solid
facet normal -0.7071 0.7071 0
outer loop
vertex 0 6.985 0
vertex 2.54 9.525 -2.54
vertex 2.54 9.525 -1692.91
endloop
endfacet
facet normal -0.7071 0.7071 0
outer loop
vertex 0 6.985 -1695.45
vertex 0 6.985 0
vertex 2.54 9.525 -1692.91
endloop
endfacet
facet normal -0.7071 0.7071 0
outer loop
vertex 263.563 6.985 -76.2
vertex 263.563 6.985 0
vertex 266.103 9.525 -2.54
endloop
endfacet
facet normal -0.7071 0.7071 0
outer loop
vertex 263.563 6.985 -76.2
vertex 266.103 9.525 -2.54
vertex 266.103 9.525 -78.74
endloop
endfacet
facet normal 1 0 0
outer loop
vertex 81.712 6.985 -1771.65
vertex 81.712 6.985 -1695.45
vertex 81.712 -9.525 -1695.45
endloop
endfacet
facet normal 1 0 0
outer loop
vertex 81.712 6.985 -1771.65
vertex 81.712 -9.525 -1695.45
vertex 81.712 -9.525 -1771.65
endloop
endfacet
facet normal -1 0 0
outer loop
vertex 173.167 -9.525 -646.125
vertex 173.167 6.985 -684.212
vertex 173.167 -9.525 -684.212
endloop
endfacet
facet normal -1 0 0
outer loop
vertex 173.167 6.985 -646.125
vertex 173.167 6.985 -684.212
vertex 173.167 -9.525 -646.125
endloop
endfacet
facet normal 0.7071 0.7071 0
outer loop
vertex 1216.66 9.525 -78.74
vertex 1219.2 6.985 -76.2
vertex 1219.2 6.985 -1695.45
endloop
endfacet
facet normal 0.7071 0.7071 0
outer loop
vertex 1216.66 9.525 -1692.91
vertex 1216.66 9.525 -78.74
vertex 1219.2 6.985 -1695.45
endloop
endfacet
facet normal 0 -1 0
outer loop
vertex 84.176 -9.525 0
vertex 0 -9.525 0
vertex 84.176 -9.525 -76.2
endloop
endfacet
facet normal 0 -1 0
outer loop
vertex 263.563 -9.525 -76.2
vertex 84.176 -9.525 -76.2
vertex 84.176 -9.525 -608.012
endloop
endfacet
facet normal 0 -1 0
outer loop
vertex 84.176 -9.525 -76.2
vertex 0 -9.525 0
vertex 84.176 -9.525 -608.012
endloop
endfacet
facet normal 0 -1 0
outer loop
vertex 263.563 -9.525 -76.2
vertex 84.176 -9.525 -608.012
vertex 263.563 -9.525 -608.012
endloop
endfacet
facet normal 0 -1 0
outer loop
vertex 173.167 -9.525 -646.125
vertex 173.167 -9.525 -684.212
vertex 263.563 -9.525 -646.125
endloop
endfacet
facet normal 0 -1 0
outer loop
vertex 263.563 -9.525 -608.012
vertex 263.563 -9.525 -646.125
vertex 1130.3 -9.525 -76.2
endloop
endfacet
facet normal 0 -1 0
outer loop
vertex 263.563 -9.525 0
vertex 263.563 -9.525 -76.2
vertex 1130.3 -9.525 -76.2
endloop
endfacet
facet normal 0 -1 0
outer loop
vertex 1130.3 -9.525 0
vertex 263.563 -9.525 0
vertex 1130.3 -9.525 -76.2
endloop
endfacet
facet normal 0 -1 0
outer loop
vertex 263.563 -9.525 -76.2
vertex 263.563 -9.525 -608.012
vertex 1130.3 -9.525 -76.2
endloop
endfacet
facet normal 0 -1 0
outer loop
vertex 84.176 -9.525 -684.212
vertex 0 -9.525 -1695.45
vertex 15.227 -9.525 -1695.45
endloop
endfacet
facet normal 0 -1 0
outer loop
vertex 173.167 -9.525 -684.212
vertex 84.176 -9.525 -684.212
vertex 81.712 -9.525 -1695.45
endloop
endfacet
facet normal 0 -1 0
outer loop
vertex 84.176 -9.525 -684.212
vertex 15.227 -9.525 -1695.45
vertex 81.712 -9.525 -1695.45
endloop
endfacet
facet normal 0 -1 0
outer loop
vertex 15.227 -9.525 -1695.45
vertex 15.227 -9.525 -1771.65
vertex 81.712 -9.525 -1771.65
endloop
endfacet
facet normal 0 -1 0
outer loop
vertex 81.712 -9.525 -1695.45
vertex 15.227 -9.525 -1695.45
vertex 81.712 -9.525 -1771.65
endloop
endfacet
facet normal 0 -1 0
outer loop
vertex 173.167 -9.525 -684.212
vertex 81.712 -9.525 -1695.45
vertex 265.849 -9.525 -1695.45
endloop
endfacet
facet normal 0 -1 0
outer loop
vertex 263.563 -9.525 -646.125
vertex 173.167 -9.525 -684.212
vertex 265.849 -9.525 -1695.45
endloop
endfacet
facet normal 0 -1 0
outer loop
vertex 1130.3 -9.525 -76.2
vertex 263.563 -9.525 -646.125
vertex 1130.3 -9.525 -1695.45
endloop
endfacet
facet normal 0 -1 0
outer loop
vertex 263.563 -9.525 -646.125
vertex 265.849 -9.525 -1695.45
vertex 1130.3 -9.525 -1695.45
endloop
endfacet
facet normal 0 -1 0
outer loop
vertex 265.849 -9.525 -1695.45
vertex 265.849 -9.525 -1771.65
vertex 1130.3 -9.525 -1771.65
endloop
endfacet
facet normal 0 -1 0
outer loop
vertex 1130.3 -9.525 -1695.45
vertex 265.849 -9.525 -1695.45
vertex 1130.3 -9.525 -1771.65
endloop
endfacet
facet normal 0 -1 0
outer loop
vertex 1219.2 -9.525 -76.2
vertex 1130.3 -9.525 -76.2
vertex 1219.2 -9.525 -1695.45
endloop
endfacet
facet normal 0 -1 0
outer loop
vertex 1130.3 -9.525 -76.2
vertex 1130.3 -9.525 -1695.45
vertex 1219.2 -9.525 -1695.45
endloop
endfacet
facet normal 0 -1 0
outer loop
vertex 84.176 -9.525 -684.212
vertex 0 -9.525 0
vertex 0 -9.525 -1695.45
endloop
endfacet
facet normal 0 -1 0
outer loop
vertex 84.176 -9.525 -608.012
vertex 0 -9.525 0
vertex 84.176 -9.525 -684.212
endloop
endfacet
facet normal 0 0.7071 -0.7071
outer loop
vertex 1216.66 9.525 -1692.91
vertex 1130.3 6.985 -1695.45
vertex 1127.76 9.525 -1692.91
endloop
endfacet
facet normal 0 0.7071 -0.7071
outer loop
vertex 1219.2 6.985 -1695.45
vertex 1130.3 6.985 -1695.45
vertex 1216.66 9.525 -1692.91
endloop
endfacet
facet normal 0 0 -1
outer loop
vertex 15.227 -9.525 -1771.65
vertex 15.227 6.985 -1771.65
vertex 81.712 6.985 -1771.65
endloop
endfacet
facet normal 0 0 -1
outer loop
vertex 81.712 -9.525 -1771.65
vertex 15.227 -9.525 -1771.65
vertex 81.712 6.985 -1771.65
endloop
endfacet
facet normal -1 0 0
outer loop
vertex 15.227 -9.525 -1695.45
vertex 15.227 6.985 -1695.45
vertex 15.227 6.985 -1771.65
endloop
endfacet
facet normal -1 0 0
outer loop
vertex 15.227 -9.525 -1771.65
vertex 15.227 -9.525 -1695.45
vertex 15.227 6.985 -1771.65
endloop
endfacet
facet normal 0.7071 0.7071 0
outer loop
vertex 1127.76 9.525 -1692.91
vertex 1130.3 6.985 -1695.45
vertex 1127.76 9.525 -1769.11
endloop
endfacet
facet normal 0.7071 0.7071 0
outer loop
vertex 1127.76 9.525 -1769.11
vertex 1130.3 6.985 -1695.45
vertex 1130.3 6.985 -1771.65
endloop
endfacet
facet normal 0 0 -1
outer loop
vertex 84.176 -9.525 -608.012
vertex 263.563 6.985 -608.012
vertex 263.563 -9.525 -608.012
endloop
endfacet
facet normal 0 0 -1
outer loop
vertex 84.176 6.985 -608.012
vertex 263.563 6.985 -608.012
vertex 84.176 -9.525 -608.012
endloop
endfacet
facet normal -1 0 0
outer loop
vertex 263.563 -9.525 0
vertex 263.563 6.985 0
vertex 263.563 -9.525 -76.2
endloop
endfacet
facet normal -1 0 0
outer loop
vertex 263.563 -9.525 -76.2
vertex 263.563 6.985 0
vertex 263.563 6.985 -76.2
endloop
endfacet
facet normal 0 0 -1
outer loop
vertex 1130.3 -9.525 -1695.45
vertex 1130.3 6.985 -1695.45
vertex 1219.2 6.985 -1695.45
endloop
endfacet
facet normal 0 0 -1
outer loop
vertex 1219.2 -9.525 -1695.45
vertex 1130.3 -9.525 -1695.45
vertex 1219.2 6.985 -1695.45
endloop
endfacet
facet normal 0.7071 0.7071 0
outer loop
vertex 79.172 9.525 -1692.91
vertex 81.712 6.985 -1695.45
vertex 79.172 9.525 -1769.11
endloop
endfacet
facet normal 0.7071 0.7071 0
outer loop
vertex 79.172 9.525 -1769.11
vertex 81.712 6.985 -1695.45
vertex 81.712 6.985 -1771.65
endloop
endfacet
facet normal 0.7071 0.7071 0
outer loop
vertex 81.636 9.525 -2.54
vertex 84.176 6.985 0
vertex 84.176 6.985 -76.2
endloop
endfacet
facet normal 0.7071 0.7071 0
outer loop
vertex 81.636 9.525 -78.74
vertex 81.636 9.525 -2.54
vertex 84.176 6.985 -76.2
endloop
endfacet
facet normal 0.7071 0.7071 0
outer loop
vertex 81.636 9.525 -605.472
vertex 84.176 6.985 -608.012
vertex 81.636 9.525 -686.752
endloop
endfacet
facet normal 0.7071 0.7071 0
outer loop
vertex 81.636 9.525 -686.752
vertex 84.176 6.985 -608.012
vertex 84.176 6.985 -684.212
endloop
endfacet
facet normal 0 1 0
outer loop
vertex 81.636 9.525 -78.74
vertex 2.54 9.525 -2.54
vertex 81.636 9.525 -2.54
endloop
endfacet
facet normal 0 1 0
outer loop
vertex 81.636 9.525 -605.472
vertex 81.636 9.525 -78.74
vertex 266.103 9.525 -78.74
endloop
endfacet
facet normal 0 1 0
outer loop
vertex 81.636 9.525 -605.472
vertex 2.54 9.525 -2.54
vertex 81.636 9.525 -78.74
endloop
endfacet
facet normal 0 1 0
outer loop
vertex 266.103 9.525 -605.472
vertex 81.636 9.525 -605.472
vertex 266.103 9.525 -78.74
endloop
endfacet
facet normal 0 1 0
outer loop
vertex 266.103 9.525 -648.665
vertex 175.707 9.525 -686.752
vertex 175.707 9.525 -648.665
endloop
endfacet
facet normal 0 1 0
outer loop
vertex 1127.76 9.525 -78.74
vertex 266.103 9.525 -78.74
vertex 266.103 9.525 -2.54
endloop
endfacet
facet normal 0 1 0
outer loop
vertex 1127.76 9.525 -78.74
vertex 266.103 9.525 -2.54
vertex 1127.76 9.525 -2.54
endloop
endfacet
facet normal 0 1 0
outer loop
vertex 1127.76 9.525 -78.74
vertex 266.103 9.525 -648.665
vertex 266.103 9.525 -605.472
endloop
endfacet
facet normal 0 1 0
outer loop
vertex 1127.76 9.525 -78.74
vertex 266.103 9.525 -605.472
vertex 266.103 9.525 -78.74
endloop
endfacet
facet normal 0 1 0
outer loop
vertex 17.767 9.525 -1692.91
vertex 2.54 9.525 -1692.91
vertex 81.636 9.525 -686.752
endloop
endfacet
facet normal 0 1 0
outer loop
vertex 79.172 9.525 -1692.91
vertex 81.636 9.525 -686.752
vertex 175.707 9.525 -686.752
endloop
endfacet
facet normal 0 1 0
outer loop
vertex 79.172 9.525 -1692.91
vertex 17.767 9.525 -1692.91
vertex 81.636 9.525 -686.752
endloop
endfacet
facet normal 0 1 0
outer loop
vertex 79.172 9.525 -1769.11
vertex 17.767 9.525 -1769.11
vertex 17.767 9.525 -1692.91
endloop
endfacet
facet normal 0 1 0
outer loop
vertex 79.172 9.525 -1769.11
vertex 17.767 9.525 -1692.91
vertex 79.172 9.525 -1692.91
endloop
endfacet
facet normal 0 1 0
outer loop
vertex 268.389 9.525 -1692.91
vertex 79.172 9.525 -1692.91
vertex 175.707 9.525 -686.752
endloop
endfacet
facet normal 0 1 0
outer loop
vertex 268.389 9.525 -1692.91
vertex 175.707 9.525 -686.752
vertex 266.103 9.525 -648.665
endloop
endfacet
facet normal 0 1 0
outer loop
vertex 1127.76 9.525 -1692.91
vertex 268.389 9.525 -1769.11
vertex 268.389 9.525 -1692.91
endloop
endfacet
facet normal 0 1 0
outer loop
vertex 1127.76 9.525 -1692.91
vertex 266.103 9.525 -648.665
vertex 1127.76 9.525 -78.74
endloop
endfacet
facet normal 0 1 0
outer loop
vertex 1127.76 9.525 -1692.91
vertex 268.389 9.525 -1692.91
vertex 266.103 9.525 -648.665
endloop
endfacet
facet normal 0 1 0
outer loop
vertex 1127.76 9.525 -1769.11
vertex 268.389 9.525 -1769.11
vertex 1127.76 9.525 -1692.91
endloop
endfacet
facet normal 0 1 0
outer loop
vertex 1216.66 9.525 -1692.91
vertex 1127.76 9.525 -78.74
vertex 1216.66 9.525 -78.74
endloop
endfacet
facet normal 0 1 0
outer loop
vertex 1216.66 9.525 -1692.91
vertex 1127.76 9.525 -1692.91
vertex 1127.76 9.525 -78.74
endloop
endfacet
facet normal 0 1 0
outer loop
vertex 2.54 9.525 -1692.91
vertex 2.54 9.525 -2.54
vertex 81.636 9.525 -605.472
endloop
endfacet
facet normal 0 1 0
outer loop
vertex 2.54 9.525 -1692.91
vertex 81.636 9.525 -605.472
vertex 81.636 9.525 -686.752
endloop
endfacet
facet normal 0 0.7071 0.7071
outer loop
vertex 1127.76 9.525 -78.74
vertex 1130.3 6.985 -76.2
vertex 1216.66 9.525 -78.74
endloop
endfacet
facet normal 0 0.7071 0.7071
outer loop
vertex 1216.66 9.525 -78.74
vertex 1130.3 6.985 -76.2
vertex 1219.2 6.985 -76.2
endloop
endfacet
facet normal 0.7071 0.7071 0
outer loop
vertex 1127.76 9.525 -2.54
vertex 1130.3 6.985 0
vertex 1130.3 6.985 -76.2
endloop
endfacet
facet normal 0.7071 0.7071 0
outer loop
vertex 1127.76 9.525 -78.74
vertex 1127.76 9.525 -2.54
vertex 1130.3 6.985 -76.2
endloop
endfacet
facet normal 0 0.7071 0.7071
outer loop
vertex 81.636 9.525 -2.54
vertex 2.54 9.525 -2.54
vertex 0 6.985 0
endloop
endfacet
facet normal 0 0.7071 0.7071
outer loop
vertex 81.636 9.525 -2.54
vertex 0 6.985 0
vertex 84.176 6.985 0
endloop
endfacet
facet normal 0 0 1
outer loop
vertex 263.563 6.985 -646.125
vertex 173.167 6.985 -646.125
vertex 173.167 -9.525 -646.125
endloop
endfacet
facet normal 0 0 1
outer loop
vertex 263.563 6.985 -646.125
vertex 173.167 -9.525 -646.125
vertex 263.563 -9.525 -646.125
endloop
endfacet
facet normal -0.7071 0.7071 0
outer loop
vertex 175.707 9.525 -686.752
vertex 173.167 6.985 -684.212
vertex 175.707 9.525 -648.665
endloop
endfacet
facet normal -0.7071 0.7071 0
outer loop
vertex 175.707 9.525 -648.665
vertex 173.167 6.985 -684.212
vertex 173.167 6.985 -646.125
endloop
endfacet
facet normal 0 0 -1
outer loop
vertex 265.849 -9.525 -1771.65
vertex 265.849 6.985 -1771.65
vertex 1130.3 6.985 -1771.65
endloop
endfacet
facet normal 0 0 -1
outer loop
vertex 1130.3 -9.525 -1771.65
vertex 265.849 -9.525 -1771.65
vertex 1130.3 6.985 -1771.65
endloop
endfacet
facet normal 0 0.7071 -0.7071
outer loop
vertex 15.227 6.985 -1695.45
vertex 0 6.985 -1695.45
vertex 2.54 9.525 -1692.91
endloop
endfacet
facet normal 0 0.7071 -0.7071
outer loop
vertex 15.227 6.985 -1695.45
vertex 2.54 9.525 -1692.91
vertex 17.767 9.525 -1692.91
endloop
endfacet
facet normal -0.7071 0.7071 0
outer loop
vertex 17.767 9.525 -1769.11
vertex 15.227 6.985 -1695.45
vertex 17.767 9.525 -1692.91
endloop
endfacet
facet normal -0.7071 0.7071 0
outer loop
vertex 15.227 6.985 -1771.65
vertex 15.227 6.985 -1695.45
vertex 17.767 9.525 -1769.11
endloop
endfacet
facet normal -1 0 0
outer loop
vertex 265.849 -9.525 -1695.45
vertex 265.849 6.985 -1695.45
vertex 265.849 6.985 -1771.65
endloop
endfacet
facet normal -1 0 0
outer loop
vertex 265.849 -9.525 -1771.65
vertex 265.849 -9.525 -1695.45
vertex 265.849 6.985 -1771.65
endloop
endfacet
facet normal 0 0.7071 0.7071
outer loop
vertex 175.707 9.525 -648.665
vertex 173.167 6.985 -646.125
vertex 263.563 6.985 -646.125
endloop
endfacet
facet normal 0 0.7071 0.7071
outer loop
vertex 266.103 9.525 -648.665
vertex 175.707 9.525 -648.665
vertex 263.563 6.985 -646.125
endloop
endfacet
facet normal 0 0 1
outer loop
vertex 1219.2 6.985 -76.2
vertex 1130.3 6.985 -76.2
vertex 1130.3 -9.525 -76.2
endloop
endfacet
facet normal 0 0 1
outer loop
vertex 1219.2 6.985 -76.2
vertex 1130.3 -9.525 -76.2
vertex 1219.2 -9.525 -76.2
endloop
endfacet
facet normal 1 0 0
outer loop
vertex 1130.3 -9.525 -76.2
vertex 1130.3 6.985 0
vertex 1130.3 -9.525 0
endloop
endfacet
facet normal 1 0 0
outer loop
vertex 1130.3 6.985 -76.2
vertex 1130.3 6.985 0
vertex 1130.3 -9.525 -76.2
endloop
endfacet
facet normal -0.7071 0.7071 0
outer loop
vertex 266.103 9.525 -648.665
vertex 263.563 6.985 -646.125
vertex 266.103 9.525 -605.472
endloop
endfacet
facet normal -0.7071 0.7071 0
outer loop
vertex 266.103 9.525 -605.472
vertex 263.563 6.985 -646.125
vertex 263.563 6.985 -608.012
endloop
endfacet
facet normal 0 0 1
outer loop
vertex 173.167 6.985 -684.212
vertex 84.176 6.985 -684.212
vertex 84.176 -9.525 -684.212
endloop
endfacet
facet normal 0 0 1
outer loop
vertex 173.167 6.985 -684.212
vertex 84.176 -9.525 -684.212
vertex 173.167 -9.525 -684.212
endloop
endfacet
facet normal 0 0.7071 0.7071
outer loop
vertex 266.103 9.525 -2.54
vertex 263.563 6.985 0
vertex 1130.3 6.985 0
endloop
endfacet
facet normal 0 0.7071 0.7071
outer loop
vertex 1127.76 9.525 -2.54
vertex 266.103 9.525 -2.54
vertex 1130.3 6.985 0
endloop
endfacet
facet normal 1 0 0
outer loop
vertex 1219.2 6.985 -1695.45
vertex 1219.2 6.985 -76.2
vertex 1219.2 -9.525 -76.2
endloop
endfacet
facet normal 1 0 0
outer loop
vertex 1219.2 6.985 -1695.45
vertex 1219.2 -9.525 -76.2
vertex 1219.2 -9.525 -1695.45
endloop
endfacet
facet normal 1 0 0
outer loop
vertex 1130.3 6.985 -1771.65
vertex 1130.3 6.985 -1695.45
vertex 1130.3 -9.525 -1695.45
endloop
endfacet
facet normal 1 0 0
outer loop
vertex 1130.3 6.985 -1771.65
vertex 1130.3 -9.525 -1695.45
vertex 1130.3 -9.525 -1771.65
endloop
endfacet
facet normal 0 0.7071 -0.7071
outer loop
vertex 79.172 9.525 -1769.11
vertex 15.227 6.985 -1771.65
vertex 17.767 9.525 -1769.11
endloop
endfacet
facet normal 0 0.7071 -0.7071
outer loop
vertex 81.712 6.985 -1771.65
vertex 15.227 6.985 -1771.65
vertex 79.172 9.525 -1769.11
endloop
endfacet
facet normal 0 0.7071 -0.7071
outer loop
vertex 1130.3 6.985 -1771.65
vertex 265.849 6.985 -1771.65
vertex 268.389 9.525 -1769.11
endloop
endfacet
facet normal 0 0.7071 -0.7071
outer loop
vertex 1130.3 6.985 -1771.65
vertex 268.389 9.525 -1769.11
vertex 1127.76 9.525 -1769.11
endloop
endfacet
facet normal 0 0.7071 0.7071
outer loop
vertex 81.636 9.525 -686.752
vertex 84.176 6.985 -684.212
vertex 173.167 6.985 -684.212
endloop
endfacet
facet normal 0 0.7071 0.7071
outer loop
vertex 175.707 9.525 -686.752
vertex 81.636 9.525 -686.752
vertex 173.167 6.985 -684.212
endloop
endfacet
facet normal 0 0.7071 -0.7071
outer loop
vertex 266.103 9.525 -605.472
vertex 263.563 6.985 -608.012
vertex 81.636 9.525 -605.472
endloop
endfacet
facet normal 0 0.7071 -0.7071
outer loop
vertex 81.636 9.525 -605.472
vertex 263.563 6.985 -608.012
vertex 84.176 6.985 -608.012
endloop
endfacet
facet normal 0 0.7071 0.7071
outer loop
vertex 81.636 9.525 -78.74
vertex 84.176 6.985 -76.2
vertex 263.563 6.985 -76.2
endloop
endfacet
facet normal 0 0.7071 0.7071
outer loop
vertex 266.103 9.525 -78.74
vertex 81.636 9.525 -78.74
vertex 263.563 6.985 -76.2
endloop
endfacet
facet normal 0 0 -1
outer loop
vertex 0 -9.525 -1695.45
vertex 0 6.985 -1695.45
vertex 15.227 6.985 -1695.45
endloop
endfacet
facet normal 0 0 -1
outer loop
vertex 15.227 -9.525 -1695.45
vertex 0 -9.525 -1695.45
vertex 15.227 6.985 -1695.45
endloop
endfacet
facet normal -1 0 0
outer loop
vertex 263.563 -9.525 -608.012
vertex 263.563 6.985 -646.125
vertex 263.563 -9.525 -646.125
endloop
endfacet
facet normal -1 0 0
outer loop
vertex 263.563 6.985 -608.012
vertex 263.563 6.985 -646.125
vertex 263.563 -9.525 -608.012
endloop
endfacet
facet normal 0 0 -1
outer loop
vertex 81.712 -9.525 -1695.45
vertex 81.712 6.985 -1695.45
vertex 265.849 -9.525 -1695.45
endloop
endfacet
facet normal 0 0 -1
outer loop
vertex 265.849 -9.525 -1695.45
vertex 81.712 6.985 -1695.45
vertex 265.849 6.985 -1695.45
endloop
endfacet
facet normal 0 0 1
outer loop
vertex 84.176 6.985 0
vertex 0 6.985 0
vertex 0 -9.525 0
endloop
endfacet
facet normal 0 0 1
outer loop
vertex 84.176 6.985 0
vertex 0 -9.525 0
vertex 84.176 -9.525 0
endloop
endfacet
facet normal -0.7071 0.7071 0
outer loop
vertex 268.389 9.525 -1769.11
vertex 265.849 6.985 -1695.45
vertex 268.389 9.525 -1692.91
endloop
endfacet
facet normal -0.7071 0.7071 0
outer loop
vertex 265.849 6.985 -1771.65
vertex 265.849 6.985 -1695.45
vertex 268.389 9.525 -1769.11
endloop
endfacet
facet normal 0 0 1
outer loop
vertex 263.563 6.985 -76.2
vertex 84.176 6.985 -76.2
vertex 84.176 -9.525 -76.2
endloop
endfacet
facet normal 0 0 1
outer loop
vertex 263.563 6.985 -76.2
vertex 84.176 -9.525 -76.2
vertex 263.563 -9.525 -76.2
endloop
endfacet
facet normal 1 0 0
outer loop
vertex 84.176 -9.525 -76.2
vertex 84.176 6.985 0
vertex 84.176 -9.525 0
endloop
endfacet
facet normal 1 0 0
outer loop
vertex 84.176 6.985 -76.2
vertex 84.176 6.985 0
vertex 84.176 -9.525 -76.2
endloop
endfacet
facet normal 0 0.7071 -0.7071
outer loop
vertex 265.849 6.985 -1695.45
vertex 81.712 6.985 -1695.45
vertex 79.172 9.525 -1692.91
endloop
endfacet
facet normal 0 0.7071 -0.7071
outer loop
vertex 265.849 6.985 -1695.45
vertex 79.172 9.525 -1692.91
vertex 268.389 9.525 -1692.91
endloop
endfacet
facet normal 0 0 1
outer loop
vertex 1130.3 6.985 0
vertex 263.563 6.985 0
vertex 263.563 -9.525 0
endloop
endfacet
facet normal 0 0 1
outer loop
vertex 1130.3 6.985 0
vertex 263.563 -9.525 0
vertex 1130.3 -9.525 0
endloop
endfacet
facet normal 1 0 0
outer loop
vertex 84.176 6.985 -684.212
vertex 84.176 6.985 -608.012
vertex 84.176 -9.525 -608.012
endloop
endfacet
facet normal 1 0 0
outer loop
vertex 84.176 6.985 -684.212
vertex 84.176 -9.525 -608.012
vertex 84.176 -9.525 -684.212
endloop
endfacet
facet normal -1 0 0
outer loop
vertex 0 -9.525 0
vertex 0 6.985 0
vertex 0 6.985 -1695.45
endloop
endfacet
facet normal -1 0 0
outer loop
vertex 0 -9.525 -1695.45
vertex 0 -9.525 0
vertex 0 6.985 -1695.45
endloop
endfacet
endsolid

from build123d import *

# Parameters (mm, degrees)
SKETCH1_W           = 1219.2
SKETCH1_H           = 1771.65
BOSS_EXTRUDE1_DEPTH = 9.525
SKETCH3_W           = 184.1373
SKETCH3_H           = 76.2
SKETCH3_W_2         = 88.9
SKETCH3_W_3         = 179.3875
SKETCH3_W_4         = 15.2273
CUT_EXTRUDE2_DEPTH  = 20.05
CHAMFER1_SIZE       = 2.54


with BuildPart() as part:
    # Sketch1 → Boss-Extrude1 (new body, symmetric)
    with BuildSketch(Plane(origin=(0, 0, 0), x_dir=(1, 0, 0), z_dir=(0, 1, 0))):
        with Locations((609.6, 885.825)):
            Rectangle(SKETCH1_W, SKETCH1_H)
    extrude(amount=BOSS_EXTRUDE1_DEPTH, both=True)

    # Sketch3 → Cut-Extrude2 (cut, through all)
    with BuildSketch(Plane(origin=(0, 9.525, 0), x_dir=(1, 0, 0), z_dir=(0, 1, 0))):
        with Locations((173.78045, 1733.55)):
            Rectangle(SKETCH3_W, SKETCH3_H)
        with Locations((1174.75, 1733.55)):
            Rectangle(SKETCH3_W_2, SKETCH3_H)
        Polygon((84.1756, 684.212499999), (173.167165563, 684.212499999), (173.167165563, 646.125199999), (263.5631, 646.125199999), (263.5631, 608.012499999), (84.1756, 608.012499999), align=None)
        with Locations((173.86935, 38.1)):
            Rectangle(SKETCH3_W_3, SKETCH3_H)
        with Locations((1174.75, 38.1)):
            Rectangle(SKETCH3_W_2, SKETCH3_H)
        with Locations((7.61365, 1733.55)):
            Rectangle(SKETCH3_W_4, SKETCH3_H)
    extrude(amount=-CUT_EXTRUDE2_DEPTH, mode=Mode.SUBTRACT)

    # Chamfer1
    chamfer1_edges = [part.edges().sort_by_distance(p)[0] for p in [
        (0, 9.525, -847.725),
        (696.93155, 9.525, 0),
        (1219.2, 9.525, -885.825),
        (698.07455, 9.525, -1771.65),
        (48.46955, 9.525, -1771.65),
        (7.61365, 9.525, -1695.45),
        (15.2273, 9.525, -1733.55),
        (1174.75, 9.525, -76.2),
        (1130.3, 9.525, -38.1),
        (263.5631, 9.525, -38.1),
        (173.86935, 9.525, -76.2),
        (84.1756, 9.525, -38.1),
        (84.1756, 9.525, -646.112499999),
        (173.86935, 9.525, -608.012499999),
        (263.5631, 9.525, -627.068849999),
        (218.365132782, 9.525, -646.125199999),
        (173.167165563, 9.525, -665.168849999),
        (128.671382782, 9.525, -684.212499999),
        (1130.3, 9.525, -1733.55),
        (1174.75, 9.525, -1695.45),
        (81.7118, 9.525, -1733.55),
        (173.78045, 9.525, -1695.45),
        (265.8491, 9.525, -1733.55),
        (42.0878, 9.525, 0),
    ]]
    chamfer(chamfer1_edges, length=CHAMFER1_SIZE)


solid = part.part
